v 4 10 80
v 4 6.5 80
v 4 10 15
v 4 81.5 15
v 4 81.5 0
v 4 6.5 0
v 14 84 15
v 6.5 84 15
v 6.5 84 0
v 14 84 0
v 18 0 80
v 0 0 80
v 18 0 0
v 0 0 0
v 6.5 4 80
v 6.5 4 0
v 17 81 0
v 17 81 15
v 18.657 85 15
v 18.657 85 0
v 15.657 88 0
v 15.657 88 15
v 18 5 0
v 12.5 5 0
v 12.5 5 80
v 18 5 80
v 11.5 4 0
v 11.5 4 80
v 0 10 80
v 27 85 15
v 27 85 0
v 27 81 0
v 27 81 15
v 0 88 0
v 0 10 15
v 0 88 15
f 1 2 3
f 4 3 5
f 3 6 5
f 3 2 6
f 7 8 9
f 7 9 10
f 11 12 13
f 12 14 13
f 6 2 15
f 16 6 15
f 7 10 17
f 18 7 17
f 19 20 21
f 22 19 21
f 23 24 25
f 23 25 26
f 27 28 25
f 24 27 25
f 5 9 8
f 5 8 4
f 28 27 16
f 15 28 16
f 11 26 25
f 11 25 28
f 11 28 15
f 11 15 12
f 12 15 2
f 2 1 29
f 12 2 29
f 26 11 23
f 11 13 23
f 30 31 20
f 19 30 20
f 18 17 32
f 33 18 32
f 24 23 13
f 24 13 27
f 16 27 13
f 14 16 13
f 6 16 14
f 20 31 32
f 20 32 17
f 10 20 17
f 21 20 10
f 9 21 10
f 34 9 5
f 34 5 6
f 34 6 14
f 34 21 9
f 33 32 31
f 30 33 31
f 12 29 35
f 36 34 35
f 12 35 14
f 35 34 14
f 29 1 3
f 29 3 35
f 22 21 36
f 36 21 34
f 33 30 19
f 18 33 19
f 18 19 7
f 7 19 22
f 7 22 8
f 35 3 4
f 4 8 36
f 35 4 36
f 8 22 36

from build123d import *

# Parameters (mm, degrees)
F1_DEPTH    = 15
F3_DEPTH    = 65
F4_T1_DEPTH = 15
F4_T3_DEPTH = 80
F4_T8_DEPTH = 80


# Not quite as in the source:
# - a fillet or chamfer that OpenCascade refuses, or shapes differently, is made with other operations: its cross-section is extruded or revolved along the edge and cut away or added
# - a feature names something its author has since deleted; it is built from what else it names


with BuildPart() as f1:
    # F0 (on Top) → F1 (new body)
    with BuildSketch(Plane.XY):
        Polygon((0, 88), (0, 0), (18, 0), (18, 5), (14, 5), (14, 4), (4, 4), (4, 84), (14, 84), (17, 81), (27, 81), (27, 85), (18.6568542495, 85), (15.6568542495, 88), align=None)
    extrude(amount=F1_DEPTH)

    # F2 (on face) → F3 (join)
    with BuildSketch(Plane.XY.offset(15)):
        Polygon((4, 10), (0, 10), (0, 0), (18, 0), (18, 5), (14, 5), (14, 4), (4, 4), align=None)
    extrude(amount=F3_DEPTH)

    # F4: chamfer of 2.5 on 3 edges, made by hand

    # F4_s2 → F4_t1 (join)
    with BuildSketch(Plane.XY):
        Polygon((6.5, 84), (4, 81.5), (4, 84), align=None)
    extrude(amount=F4_T1_DEPTH)

    # F4_s4 → F4_t3 (join)
    with BuildSketch(Plane.XY):
        Polygon((4, 6.5), (6.5, 4), (4, 4), align=None)
    extrude(amount=F4_T3_DEPTH)


with BuildPart() as f4_tool6:
    # F4_s7 → F4_t8 (new body)
    with BuildSketch(Plane.XY):
        Polygon((11.5, 4), (14, 6.5), (14, 4), align=None)
    extrude(amount=F4_T8_DEPTH)

    split(bisect_by=Plane.XZ.offset(-5), keep=Keep.TOP)


with BuildPart() as f1_1:
    add(f1.part)

    # F4_t5: union F4_tool6
    add(f4_tool6.part)


solid = f1_1.part
